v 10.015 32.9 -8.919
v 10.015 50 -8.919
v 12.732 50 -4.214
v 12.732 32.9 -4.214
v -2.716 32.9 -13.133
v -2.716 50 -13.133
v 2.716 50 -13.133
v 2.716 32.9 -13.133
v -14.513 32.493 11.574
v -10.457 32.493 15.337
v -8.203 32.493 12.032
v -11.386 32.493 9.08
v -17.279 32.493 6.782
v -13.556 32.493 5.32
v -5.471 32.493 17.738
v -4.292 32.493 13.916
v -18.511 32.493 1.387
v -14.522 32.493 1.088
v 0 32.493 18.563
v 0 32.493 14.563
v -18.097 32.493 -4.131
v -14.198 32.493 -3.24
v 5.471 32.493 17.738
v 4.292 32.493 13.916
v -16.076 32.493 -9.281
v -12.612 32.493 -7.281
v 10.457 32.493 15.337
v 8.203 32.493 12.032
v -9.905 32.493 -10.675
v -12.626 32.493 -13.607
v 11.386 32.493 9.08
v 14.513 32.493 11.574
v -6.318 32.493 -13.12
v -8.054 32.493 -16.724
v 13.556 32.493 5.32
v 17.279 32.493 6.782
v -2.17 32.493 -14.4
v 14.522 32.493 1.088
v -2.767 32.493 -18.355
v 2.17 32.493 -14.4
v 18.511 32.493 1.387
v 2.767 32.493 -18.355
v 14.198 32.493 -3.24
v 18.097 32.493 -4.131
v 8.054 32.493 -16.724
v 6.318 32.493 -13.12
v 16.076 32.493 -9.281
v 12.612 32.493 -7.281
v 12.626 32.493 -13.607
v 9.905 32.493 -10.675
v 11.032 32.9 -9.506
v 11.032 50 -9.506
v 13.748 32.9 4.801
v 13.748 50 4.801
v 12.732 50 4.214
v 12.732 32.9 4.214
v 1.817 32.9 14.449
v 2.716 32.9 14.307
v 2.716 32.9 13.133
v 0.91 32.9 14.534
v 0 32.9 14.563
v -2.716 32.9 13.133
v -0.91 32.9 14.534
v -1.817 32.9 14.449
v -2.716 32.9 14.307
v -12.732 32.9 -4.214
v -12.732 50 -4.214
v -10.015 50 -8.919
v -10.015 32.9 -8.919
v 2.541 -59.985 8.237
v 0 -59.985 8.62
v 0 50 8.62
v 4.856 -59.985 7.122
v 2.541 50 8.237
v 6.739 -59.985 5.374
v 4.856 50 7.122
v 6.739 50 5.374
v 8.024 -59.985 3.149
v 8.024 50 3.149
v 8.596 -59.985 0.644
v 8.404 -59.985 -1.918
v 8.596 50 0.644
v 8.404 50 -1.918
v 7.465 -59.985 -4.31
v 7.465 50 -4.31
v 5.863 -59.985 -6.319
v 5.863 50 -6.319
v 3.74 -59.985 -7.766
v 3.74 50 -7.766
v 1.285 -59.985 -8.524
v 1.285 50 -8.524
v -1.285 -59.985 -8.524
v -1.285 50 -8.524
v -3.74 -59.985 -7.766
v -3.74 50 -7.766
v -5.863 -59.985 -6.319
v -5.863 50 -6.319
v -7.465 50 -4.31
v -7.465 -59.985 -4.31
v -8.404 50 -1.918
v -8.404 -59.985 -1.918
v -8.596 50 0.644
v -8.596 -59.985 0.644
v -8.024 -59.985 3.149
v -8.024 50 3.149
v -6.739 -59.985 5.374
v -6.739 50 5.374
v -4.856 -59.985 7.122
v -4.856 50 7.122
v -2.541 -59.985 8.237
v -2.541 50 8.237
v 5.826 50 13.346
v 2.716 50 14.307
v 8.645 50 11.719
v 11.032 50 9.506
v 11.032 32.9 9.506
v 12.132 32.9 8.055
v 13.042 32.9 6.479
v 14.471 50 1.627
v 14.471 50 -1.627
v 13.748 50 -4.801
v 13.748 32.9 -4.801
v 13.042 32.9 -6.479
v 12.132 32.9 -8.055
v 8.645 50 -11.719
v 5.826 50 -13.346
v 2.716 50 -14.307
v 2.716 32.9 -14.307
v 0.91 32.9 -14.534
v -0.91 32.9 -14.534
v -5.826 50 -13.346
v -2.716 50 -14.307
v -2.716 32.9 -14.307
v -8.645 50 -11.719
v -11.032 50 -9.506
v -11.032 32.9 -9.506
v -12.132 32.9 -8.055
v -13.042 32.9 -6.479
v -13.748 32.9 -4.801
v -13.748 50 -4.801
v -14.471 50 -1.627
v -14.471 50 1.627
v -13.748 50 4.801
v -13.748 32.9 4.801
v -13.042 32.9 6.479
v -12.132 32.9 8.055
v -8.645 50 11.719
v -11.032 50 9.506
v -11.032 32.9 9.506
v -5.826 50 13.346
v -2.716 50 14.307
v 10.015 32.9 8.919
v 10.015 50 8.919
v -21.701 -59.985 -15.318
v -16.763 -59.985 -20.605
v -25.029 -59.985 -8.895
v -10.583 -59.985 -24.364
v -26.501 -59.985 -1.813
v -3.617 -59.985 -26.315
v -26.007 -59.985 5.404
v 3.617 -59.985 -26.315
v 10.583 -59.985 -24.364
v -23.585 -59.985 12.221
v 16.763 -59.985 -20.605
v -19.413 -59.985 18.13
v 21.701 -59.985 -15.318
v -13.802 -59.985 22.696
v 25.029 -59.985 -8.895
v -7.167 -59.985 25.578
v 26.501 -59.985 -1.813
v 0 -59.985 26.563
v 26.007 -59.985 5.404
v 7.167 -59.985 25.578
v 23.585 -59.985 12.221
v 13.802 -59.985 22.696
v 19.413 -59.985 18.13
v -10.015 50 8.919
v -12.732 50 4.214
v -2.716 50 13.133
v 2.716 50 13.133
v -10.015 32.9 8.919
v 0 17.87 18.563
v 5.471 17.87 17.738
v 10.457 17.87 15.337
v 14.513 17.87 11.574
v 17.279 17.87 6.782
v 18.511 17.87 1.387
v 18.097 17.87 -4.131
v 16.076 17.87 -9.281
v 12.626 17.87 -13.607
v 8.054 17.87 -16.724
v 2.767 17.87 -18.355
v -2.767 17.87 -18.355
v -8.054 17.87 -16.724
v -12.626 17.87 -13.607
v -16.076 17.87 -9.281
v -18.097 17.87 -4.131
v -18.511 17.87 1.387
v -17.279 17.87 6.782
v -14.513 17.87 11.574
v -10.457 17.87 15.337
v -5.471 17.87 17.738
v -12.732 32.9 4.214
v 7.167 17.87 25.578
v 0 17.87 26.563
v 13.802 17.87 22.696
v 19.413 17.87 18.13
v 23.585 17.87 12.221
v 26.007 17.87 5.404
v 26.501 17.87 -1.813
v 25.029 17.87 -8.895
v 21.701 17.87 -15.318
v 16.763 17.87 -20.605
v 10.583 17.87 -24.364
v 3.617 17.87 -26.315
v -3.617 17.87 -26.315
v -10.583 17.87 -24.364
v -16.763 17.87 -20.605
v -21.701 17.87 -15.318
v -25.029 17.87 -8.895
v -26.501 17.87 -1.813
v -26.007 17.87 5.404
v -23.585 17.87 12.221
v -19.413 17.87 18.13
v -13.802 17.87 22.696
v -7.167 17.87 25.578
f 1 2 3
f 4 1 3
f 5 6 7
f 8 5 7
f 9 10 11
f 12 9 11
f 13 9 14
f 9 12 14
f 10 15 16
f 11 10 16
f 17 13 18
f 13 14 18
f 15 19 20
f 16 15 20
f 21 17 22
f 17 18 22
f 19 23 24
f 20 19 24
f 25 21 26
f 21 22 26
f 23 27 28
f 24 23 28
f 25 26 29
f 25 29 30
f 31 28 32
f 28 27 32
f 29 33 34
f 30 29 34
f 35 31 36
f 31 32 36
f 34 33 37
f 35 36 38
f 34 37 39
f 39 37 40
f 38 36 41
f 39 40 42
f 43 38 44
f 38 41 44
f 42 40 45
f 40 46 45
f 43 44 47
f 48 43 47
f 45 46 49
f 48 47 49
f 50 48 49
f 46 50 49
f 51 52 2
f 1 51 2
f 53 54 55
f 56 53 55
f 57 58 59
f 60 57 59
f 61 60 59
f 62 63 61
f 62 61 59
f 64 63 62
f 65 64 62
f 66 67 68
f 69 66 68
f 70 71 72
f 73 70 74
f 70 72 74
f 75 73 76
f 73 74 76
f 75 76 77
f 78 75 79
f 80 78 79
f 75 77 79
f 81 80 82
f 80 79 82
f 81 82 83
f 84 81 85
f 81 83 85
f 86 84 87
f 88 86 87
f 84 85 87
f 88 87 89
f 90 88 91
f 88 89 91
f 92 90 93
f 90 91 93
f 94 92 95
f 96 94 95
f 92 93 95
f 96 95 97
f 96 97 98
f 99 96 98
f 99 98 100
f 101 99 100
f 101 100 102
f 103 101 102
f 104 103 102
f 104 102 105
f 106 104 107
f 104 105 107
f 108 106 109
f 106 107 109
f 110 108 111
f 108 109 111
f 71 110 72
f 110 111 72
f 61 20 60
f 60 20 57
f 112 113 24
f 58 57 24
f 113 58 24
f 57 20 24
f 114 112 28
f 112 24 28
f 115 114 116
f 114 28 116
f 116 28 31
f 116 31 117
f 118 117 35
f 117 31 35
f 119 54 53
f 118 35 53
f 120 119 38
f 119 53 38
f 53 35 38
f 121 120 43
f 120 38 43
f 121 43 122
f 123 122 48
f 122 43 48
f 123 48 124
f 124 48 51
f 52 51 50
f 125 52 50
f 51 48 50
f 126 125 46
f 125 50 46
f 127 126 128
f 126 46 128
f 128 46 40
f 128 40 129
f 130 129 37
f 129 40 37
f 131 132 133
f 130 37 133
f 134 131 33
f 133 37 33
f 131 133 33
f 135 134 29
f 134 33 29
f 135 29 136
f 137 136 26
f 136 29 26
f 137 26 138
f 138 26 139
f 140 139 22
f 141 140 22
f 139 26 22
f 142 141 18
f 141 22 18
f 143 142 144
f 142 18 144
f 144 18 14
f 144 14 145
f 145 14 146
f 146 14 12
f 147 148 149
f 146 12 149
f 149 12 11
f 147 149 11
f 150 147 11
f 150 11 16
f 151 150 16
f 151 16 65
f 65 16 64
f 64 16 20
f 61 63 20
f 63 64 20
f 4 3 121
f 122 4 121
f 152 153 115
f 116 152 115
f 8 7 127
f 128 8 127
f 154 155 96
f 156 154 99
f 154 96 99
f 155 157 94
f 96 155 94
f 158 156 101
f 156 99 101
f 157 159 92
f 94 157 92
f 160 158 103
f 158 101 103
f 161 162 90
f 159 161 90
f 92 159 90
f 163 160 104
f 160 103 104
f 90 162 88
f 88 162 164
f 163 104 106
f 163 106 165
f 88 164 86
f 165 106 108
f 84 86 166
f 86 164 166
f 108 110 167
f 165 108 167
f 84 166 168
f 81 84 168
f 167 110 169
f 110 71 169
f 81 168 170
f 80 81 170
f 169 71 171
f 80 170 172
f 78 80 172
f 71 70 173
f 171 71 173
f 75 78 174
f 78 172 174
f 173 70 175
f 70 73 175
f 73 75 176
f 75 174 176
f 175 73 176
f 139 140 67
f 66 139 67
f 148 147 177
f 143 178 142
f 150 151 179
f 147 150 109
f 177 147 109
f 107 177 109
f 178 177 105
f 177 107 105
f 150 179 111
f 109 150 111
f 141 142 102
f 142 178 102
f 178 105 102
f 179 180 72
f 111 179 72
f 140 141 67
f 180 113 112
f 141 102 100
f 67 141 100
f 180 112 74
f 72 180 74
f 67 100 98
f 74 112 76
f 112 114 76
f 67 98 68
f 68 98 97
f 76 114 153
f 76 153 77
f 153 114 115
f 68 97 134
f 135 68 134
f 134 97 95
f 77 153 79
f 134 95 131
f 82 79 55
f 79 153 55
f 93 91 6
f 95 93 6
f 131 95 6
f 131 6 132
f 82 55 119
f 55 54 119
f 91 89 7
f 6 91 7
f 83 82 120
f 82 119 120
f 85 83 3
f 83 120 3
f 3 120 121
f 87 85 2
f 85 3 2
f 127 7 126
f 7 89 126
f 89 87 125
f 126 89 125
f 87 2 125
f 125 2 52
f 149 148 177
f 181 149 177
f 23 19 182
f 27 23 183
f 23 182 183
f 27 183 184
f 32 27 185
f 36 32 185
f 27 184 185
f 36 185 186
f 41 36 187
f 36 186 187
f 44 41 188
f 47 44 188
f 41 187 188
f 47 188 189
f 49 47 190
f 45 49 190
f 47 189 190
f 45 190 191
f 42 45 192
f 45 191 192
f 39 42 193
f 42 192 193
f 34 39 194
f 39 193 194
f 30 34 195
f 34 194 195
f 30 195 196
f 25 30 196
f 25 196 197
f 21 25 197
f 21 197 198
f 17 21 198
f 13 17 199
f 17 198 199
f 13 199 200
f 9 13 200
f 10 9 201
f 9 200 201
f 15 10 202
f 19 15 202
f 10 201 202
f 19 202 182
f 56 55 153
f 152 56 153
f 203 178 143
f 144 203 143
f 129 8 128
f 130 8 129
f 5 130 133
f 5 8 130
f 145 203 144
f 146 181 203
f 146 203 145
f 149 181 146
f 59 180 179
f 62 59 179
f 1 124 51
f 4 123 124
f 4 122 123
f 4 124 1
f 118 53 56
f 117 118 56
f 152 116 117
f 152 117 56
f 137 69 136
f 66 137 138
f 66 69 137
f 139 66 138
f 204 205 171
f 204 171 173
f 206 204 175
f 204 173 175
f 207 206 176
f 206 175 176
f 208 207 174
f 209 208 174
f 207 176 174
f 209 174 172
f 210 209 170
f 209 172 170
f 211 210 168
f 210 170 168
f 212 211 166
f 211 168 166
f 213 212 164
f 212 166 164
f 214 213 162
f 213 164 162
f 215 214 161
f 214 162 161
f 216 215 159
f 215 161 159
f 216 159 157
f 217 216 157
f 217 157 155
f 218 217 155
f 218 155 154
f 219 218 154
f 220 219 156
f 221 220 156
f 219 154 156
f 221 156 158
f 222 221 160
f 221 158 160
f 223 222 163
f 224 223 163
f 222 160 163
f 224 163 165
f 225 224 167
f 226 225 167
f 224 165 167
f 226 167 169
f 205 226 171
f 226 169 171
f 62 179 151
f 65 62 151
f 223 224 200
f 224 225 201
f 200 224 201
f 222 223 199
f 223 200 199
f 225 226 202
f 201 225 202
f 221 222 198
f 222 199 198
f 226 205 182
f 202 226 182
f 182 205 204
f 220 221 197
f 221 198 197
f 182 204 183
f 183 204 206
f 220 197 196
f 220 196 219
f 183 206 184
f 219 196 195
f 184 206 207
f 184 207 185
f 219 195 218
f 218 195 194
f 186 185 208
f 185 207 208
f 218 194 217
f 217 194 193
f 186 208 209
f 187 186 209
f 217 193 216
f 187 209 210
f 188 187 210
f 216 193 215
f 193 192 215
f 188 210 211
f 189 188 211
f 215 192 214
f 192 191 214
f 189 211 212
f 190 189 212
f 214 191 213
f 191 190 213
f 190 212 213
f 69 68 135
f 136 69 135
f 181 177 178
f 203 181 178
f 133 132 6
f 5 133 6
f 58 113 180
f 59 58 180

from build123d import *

# Parameters (mm, degrees)
F3_DEPTH = 17.1


with BuildPart() as f1:
    # F0 (on Right) → F1 (revolve)
    with BuildSketch(Plane.YZ):
        Polygon((17.869576, 26.562618), (-59.984905, 26.562618), (-59.984905, 8.62), (50, 8.62), (50, 14.562618), (32.493035, 14.562618), (32.493035, 18.562618), (17.869576, 18.562618), align=None)
    revolve(axis=Axis((0, 1.113363, 0), (0, 1, 0)))


with BuildPart() as f3:
    # F2 (on face) → F3 (new body)
    with BuildSketch(Plane(origin=(0, 50, 0), x_dir=(-1, 0, 0), z_dir=(0, 1, 0))):
        with BuildLine():
            Line((-2.716261, 14.562618), (-2.716261, 14.307053))
            ThreePointArc((-2.716261, 14.307053), (-1.364129, 14.498586), (0, 14.562618))
            Line((0, 14.562618), (-2.716261, 14.562618))
        make_face()
        with BuildLine():
            Line((2.716261, 14.562618), (0, 14.562618))
            ThreePointArc((0, 14.562618), (1.364129, 14.498586), (2.716261, 14.307053))
            Line((2.716261, 14.307053), (2.716261, 14.562618))
        make_face()
        with BuildLine():
            ThreePointArc((-12.611597, 7.281309), (-11.87408, 8.430663), (-11.032141, 9.505878))
            Line((-11.032141, 9.505878), (-11.253467, 9.63366))
            Line((-11.253467, 9.63366), (-12.611597, 7.281309))
        make_face()
        with BuildLine():
            ThreePointArc((-13.748402, 4.801175), (-13.238208, 6.067923), (-12.611597, 7.281309))
            Line((-12.611597, 7.281309), (-13.969728, 4.928958))
            Line((-13.969728, 4.928958), (-13.748402, 4.801175))
        make_face()
        with BuildLine():
            ThreePointArc((-12.611597, -7.281309), (-13.238208, -6.067923), (-13.748402, -4.801175))
            Line((-13.748402, -4.801175), (-13.969728, -4.928958))
            Line((-13.969728, -4.928958), (-12.611597, -7.281309))
        make_face()
        with BuildLine():
            ThreePointArc((-11.032141, -9.505878), (-11.87408, -8.430663), (-12.611597, -7.281309))
            Line((-12.611597, -7.281309), (-11.253467, -9.63366))
            Line((-11.253467, -9.63366), (-11.032141, -9.505878))
        make_face()
        with BuildLine():
            ThreePointArc((0, -14.562618), (-1.364129, -14.498586), (-2.716261, -14.307053))
            Line((-2.716261, -14.307053), (-2.716261, -14.562618))
            Line((-2.716261, -14.562618), (0, -14.562618))
        make_face()
        with BuildLine():
            ThreePointArc((2.716261, -14.307053), (1.364129, -14.498586), (0, -14.562618))
            Line((0, -14.562618), (2.716261, -14.562618))
            Line((2.716261, -14.562618), (2.716261, -14.307053))
        make_face()
        with BuildLine():
            Line((11.253467, -9.63366), (12.611597, -7.281309))
            ThreePointArc((12.611597, -7.281309), (11.87408, -8.430663), (11.032141, -9.505878))
            Line((11.032141, -9.505878), (11.253467, -9.63366))
        make_face()
        with BuildLine():
            Line((13.969728, -4.928958), (13.748402, -4.801175))
            ThreePointArc((13.748402, -4.801175), (13.238208, -6.067923), (12.611597, -7.281309))
            Line((12.611597, -7.281309), (13.969728, -4.928958))
        make_face()
        with BuildLine():
            Line((13.969728, 4.928958), (12.611597, 7.281309))
            ThreePointArc((12.611597, 7.281309), (13.238208, 6.067923), (13.748402, 4.801175))
            Line((13.748402, 4.801175), (13.969728, 4.928958))
        make_face()
        with BuildLine():
            Line((11.253467, 9.63366), (11.032141, 9.505878))
            ThreePointArc((11.032141, 9.505878), (11.87408, 8.430663), (12.611597, 7.281309))
            Line((12.611597, 7.281309), (11.253467, 9.63366))
        make_face()
        with BuildLine():
            Line((-2.716261, 14.307053), (-2.716261, 13.132972))
            Line((-2.716261, 13.132972), (2.716261, 13.132972))
            Line((2.716261, 13.132972), (2.716261, 14.307053))
            ThreePointArc((2.716261, 14.307053), (1.364129, 14.498586), (0, 14.562618))
            ThreePointArc((0, 14.562618), (-1.364129, 14.498586), (-2.716261, 14.307053))
        make_face()
        with BuildLine():
            Line((-12.731618, -4.214135), (-13.748402, -4.801175))
            ThreePointArc((-13.748402, -4.801175), (-13.238208, -6.067923), (-12.611597, -7.281309))
            ThreePointArc((-12.611597, -7.281309), (-11.87408, -8.430663), (-11.032141, -9.505878))
            Line((-11.032141, -9.505878), (-10.015357, -8.918837))
            Line((-10.015357, -8.918837), (-12.731618, -4.214135))
        make_face()
        with BuildLine():
            Line((-2.716261, -13.132972), (-2.716261, -14.307053))
            ThreePointArc((-2.716261, -14.307053), (-1.364129, -14.498586), (0, -14.562618))
            ThreePointArc((0, -14.562618), (1.364129, -14.498586), (2.716261, -14.307053))
            Line((2.716261, -14.307053), (2.716261, -13.132972))
            Line((2.716261, -13.132972), (-2.716261, -13.132972))
        make_face()
        with BuildLine():
            ThreePointArc((12.611597, -7.281309), (13.238208, -6.067923), (13.748402, -4.801175))
            Line((13.748402, -4.801175), (12.731618, -4.214135))
            Line((12.731618, -4.214135), (10.015357, -8.918837))
            Line((10.015357, -8.918837), (11.032141, -9.505878))
            ThreePointArc((11.032141, -9.505878), (11.87408, -8.430663), (12.611597, -7.281309))
        make_face()
        with BuildLine():
            ThreePointArc((12.611597, 7.281309), (11.87408, 8.430663), (11.032141, 9.505878))
            Line((11.032141, 9.505878), (10.015357, 8.918837))
            Line((10.015357, 8.918837), (12.731618, 4.214135))
            Line((12.731618, 4.214135), (13.748402, 4.801175))
            ThreePointArc((13.748402, 4.801175), (13.238208, 6.067923), (12.611597, 7.281309))
        make_face()
        with BuildLine():
            Line((-10.015357, 8.918837), (-11.032141, 9.505878))
            ThreePointArc((-11.032141, 9.505878), (-11.87408, 8.430663), (-12.611597, 7.281309))
            ThreePointArc((-12.611597, 7.281309), (-13.238208, 6.067923), (-13.748402, 4.801175))
            Line((-13.748402, 4.801175), (-12.731618, 4.214135))
            Line((-12.731618, 4.214135), (-10.015357, 8.918837))
        make_face()
    extrude(amount=-F3_DEPTH)


with BuildPart() as f1_1:
    add(f1.part)

    # F4: cut F3
    add(f3.part, mode=Mode.SUBTRACT)


solid = f1_1.part
